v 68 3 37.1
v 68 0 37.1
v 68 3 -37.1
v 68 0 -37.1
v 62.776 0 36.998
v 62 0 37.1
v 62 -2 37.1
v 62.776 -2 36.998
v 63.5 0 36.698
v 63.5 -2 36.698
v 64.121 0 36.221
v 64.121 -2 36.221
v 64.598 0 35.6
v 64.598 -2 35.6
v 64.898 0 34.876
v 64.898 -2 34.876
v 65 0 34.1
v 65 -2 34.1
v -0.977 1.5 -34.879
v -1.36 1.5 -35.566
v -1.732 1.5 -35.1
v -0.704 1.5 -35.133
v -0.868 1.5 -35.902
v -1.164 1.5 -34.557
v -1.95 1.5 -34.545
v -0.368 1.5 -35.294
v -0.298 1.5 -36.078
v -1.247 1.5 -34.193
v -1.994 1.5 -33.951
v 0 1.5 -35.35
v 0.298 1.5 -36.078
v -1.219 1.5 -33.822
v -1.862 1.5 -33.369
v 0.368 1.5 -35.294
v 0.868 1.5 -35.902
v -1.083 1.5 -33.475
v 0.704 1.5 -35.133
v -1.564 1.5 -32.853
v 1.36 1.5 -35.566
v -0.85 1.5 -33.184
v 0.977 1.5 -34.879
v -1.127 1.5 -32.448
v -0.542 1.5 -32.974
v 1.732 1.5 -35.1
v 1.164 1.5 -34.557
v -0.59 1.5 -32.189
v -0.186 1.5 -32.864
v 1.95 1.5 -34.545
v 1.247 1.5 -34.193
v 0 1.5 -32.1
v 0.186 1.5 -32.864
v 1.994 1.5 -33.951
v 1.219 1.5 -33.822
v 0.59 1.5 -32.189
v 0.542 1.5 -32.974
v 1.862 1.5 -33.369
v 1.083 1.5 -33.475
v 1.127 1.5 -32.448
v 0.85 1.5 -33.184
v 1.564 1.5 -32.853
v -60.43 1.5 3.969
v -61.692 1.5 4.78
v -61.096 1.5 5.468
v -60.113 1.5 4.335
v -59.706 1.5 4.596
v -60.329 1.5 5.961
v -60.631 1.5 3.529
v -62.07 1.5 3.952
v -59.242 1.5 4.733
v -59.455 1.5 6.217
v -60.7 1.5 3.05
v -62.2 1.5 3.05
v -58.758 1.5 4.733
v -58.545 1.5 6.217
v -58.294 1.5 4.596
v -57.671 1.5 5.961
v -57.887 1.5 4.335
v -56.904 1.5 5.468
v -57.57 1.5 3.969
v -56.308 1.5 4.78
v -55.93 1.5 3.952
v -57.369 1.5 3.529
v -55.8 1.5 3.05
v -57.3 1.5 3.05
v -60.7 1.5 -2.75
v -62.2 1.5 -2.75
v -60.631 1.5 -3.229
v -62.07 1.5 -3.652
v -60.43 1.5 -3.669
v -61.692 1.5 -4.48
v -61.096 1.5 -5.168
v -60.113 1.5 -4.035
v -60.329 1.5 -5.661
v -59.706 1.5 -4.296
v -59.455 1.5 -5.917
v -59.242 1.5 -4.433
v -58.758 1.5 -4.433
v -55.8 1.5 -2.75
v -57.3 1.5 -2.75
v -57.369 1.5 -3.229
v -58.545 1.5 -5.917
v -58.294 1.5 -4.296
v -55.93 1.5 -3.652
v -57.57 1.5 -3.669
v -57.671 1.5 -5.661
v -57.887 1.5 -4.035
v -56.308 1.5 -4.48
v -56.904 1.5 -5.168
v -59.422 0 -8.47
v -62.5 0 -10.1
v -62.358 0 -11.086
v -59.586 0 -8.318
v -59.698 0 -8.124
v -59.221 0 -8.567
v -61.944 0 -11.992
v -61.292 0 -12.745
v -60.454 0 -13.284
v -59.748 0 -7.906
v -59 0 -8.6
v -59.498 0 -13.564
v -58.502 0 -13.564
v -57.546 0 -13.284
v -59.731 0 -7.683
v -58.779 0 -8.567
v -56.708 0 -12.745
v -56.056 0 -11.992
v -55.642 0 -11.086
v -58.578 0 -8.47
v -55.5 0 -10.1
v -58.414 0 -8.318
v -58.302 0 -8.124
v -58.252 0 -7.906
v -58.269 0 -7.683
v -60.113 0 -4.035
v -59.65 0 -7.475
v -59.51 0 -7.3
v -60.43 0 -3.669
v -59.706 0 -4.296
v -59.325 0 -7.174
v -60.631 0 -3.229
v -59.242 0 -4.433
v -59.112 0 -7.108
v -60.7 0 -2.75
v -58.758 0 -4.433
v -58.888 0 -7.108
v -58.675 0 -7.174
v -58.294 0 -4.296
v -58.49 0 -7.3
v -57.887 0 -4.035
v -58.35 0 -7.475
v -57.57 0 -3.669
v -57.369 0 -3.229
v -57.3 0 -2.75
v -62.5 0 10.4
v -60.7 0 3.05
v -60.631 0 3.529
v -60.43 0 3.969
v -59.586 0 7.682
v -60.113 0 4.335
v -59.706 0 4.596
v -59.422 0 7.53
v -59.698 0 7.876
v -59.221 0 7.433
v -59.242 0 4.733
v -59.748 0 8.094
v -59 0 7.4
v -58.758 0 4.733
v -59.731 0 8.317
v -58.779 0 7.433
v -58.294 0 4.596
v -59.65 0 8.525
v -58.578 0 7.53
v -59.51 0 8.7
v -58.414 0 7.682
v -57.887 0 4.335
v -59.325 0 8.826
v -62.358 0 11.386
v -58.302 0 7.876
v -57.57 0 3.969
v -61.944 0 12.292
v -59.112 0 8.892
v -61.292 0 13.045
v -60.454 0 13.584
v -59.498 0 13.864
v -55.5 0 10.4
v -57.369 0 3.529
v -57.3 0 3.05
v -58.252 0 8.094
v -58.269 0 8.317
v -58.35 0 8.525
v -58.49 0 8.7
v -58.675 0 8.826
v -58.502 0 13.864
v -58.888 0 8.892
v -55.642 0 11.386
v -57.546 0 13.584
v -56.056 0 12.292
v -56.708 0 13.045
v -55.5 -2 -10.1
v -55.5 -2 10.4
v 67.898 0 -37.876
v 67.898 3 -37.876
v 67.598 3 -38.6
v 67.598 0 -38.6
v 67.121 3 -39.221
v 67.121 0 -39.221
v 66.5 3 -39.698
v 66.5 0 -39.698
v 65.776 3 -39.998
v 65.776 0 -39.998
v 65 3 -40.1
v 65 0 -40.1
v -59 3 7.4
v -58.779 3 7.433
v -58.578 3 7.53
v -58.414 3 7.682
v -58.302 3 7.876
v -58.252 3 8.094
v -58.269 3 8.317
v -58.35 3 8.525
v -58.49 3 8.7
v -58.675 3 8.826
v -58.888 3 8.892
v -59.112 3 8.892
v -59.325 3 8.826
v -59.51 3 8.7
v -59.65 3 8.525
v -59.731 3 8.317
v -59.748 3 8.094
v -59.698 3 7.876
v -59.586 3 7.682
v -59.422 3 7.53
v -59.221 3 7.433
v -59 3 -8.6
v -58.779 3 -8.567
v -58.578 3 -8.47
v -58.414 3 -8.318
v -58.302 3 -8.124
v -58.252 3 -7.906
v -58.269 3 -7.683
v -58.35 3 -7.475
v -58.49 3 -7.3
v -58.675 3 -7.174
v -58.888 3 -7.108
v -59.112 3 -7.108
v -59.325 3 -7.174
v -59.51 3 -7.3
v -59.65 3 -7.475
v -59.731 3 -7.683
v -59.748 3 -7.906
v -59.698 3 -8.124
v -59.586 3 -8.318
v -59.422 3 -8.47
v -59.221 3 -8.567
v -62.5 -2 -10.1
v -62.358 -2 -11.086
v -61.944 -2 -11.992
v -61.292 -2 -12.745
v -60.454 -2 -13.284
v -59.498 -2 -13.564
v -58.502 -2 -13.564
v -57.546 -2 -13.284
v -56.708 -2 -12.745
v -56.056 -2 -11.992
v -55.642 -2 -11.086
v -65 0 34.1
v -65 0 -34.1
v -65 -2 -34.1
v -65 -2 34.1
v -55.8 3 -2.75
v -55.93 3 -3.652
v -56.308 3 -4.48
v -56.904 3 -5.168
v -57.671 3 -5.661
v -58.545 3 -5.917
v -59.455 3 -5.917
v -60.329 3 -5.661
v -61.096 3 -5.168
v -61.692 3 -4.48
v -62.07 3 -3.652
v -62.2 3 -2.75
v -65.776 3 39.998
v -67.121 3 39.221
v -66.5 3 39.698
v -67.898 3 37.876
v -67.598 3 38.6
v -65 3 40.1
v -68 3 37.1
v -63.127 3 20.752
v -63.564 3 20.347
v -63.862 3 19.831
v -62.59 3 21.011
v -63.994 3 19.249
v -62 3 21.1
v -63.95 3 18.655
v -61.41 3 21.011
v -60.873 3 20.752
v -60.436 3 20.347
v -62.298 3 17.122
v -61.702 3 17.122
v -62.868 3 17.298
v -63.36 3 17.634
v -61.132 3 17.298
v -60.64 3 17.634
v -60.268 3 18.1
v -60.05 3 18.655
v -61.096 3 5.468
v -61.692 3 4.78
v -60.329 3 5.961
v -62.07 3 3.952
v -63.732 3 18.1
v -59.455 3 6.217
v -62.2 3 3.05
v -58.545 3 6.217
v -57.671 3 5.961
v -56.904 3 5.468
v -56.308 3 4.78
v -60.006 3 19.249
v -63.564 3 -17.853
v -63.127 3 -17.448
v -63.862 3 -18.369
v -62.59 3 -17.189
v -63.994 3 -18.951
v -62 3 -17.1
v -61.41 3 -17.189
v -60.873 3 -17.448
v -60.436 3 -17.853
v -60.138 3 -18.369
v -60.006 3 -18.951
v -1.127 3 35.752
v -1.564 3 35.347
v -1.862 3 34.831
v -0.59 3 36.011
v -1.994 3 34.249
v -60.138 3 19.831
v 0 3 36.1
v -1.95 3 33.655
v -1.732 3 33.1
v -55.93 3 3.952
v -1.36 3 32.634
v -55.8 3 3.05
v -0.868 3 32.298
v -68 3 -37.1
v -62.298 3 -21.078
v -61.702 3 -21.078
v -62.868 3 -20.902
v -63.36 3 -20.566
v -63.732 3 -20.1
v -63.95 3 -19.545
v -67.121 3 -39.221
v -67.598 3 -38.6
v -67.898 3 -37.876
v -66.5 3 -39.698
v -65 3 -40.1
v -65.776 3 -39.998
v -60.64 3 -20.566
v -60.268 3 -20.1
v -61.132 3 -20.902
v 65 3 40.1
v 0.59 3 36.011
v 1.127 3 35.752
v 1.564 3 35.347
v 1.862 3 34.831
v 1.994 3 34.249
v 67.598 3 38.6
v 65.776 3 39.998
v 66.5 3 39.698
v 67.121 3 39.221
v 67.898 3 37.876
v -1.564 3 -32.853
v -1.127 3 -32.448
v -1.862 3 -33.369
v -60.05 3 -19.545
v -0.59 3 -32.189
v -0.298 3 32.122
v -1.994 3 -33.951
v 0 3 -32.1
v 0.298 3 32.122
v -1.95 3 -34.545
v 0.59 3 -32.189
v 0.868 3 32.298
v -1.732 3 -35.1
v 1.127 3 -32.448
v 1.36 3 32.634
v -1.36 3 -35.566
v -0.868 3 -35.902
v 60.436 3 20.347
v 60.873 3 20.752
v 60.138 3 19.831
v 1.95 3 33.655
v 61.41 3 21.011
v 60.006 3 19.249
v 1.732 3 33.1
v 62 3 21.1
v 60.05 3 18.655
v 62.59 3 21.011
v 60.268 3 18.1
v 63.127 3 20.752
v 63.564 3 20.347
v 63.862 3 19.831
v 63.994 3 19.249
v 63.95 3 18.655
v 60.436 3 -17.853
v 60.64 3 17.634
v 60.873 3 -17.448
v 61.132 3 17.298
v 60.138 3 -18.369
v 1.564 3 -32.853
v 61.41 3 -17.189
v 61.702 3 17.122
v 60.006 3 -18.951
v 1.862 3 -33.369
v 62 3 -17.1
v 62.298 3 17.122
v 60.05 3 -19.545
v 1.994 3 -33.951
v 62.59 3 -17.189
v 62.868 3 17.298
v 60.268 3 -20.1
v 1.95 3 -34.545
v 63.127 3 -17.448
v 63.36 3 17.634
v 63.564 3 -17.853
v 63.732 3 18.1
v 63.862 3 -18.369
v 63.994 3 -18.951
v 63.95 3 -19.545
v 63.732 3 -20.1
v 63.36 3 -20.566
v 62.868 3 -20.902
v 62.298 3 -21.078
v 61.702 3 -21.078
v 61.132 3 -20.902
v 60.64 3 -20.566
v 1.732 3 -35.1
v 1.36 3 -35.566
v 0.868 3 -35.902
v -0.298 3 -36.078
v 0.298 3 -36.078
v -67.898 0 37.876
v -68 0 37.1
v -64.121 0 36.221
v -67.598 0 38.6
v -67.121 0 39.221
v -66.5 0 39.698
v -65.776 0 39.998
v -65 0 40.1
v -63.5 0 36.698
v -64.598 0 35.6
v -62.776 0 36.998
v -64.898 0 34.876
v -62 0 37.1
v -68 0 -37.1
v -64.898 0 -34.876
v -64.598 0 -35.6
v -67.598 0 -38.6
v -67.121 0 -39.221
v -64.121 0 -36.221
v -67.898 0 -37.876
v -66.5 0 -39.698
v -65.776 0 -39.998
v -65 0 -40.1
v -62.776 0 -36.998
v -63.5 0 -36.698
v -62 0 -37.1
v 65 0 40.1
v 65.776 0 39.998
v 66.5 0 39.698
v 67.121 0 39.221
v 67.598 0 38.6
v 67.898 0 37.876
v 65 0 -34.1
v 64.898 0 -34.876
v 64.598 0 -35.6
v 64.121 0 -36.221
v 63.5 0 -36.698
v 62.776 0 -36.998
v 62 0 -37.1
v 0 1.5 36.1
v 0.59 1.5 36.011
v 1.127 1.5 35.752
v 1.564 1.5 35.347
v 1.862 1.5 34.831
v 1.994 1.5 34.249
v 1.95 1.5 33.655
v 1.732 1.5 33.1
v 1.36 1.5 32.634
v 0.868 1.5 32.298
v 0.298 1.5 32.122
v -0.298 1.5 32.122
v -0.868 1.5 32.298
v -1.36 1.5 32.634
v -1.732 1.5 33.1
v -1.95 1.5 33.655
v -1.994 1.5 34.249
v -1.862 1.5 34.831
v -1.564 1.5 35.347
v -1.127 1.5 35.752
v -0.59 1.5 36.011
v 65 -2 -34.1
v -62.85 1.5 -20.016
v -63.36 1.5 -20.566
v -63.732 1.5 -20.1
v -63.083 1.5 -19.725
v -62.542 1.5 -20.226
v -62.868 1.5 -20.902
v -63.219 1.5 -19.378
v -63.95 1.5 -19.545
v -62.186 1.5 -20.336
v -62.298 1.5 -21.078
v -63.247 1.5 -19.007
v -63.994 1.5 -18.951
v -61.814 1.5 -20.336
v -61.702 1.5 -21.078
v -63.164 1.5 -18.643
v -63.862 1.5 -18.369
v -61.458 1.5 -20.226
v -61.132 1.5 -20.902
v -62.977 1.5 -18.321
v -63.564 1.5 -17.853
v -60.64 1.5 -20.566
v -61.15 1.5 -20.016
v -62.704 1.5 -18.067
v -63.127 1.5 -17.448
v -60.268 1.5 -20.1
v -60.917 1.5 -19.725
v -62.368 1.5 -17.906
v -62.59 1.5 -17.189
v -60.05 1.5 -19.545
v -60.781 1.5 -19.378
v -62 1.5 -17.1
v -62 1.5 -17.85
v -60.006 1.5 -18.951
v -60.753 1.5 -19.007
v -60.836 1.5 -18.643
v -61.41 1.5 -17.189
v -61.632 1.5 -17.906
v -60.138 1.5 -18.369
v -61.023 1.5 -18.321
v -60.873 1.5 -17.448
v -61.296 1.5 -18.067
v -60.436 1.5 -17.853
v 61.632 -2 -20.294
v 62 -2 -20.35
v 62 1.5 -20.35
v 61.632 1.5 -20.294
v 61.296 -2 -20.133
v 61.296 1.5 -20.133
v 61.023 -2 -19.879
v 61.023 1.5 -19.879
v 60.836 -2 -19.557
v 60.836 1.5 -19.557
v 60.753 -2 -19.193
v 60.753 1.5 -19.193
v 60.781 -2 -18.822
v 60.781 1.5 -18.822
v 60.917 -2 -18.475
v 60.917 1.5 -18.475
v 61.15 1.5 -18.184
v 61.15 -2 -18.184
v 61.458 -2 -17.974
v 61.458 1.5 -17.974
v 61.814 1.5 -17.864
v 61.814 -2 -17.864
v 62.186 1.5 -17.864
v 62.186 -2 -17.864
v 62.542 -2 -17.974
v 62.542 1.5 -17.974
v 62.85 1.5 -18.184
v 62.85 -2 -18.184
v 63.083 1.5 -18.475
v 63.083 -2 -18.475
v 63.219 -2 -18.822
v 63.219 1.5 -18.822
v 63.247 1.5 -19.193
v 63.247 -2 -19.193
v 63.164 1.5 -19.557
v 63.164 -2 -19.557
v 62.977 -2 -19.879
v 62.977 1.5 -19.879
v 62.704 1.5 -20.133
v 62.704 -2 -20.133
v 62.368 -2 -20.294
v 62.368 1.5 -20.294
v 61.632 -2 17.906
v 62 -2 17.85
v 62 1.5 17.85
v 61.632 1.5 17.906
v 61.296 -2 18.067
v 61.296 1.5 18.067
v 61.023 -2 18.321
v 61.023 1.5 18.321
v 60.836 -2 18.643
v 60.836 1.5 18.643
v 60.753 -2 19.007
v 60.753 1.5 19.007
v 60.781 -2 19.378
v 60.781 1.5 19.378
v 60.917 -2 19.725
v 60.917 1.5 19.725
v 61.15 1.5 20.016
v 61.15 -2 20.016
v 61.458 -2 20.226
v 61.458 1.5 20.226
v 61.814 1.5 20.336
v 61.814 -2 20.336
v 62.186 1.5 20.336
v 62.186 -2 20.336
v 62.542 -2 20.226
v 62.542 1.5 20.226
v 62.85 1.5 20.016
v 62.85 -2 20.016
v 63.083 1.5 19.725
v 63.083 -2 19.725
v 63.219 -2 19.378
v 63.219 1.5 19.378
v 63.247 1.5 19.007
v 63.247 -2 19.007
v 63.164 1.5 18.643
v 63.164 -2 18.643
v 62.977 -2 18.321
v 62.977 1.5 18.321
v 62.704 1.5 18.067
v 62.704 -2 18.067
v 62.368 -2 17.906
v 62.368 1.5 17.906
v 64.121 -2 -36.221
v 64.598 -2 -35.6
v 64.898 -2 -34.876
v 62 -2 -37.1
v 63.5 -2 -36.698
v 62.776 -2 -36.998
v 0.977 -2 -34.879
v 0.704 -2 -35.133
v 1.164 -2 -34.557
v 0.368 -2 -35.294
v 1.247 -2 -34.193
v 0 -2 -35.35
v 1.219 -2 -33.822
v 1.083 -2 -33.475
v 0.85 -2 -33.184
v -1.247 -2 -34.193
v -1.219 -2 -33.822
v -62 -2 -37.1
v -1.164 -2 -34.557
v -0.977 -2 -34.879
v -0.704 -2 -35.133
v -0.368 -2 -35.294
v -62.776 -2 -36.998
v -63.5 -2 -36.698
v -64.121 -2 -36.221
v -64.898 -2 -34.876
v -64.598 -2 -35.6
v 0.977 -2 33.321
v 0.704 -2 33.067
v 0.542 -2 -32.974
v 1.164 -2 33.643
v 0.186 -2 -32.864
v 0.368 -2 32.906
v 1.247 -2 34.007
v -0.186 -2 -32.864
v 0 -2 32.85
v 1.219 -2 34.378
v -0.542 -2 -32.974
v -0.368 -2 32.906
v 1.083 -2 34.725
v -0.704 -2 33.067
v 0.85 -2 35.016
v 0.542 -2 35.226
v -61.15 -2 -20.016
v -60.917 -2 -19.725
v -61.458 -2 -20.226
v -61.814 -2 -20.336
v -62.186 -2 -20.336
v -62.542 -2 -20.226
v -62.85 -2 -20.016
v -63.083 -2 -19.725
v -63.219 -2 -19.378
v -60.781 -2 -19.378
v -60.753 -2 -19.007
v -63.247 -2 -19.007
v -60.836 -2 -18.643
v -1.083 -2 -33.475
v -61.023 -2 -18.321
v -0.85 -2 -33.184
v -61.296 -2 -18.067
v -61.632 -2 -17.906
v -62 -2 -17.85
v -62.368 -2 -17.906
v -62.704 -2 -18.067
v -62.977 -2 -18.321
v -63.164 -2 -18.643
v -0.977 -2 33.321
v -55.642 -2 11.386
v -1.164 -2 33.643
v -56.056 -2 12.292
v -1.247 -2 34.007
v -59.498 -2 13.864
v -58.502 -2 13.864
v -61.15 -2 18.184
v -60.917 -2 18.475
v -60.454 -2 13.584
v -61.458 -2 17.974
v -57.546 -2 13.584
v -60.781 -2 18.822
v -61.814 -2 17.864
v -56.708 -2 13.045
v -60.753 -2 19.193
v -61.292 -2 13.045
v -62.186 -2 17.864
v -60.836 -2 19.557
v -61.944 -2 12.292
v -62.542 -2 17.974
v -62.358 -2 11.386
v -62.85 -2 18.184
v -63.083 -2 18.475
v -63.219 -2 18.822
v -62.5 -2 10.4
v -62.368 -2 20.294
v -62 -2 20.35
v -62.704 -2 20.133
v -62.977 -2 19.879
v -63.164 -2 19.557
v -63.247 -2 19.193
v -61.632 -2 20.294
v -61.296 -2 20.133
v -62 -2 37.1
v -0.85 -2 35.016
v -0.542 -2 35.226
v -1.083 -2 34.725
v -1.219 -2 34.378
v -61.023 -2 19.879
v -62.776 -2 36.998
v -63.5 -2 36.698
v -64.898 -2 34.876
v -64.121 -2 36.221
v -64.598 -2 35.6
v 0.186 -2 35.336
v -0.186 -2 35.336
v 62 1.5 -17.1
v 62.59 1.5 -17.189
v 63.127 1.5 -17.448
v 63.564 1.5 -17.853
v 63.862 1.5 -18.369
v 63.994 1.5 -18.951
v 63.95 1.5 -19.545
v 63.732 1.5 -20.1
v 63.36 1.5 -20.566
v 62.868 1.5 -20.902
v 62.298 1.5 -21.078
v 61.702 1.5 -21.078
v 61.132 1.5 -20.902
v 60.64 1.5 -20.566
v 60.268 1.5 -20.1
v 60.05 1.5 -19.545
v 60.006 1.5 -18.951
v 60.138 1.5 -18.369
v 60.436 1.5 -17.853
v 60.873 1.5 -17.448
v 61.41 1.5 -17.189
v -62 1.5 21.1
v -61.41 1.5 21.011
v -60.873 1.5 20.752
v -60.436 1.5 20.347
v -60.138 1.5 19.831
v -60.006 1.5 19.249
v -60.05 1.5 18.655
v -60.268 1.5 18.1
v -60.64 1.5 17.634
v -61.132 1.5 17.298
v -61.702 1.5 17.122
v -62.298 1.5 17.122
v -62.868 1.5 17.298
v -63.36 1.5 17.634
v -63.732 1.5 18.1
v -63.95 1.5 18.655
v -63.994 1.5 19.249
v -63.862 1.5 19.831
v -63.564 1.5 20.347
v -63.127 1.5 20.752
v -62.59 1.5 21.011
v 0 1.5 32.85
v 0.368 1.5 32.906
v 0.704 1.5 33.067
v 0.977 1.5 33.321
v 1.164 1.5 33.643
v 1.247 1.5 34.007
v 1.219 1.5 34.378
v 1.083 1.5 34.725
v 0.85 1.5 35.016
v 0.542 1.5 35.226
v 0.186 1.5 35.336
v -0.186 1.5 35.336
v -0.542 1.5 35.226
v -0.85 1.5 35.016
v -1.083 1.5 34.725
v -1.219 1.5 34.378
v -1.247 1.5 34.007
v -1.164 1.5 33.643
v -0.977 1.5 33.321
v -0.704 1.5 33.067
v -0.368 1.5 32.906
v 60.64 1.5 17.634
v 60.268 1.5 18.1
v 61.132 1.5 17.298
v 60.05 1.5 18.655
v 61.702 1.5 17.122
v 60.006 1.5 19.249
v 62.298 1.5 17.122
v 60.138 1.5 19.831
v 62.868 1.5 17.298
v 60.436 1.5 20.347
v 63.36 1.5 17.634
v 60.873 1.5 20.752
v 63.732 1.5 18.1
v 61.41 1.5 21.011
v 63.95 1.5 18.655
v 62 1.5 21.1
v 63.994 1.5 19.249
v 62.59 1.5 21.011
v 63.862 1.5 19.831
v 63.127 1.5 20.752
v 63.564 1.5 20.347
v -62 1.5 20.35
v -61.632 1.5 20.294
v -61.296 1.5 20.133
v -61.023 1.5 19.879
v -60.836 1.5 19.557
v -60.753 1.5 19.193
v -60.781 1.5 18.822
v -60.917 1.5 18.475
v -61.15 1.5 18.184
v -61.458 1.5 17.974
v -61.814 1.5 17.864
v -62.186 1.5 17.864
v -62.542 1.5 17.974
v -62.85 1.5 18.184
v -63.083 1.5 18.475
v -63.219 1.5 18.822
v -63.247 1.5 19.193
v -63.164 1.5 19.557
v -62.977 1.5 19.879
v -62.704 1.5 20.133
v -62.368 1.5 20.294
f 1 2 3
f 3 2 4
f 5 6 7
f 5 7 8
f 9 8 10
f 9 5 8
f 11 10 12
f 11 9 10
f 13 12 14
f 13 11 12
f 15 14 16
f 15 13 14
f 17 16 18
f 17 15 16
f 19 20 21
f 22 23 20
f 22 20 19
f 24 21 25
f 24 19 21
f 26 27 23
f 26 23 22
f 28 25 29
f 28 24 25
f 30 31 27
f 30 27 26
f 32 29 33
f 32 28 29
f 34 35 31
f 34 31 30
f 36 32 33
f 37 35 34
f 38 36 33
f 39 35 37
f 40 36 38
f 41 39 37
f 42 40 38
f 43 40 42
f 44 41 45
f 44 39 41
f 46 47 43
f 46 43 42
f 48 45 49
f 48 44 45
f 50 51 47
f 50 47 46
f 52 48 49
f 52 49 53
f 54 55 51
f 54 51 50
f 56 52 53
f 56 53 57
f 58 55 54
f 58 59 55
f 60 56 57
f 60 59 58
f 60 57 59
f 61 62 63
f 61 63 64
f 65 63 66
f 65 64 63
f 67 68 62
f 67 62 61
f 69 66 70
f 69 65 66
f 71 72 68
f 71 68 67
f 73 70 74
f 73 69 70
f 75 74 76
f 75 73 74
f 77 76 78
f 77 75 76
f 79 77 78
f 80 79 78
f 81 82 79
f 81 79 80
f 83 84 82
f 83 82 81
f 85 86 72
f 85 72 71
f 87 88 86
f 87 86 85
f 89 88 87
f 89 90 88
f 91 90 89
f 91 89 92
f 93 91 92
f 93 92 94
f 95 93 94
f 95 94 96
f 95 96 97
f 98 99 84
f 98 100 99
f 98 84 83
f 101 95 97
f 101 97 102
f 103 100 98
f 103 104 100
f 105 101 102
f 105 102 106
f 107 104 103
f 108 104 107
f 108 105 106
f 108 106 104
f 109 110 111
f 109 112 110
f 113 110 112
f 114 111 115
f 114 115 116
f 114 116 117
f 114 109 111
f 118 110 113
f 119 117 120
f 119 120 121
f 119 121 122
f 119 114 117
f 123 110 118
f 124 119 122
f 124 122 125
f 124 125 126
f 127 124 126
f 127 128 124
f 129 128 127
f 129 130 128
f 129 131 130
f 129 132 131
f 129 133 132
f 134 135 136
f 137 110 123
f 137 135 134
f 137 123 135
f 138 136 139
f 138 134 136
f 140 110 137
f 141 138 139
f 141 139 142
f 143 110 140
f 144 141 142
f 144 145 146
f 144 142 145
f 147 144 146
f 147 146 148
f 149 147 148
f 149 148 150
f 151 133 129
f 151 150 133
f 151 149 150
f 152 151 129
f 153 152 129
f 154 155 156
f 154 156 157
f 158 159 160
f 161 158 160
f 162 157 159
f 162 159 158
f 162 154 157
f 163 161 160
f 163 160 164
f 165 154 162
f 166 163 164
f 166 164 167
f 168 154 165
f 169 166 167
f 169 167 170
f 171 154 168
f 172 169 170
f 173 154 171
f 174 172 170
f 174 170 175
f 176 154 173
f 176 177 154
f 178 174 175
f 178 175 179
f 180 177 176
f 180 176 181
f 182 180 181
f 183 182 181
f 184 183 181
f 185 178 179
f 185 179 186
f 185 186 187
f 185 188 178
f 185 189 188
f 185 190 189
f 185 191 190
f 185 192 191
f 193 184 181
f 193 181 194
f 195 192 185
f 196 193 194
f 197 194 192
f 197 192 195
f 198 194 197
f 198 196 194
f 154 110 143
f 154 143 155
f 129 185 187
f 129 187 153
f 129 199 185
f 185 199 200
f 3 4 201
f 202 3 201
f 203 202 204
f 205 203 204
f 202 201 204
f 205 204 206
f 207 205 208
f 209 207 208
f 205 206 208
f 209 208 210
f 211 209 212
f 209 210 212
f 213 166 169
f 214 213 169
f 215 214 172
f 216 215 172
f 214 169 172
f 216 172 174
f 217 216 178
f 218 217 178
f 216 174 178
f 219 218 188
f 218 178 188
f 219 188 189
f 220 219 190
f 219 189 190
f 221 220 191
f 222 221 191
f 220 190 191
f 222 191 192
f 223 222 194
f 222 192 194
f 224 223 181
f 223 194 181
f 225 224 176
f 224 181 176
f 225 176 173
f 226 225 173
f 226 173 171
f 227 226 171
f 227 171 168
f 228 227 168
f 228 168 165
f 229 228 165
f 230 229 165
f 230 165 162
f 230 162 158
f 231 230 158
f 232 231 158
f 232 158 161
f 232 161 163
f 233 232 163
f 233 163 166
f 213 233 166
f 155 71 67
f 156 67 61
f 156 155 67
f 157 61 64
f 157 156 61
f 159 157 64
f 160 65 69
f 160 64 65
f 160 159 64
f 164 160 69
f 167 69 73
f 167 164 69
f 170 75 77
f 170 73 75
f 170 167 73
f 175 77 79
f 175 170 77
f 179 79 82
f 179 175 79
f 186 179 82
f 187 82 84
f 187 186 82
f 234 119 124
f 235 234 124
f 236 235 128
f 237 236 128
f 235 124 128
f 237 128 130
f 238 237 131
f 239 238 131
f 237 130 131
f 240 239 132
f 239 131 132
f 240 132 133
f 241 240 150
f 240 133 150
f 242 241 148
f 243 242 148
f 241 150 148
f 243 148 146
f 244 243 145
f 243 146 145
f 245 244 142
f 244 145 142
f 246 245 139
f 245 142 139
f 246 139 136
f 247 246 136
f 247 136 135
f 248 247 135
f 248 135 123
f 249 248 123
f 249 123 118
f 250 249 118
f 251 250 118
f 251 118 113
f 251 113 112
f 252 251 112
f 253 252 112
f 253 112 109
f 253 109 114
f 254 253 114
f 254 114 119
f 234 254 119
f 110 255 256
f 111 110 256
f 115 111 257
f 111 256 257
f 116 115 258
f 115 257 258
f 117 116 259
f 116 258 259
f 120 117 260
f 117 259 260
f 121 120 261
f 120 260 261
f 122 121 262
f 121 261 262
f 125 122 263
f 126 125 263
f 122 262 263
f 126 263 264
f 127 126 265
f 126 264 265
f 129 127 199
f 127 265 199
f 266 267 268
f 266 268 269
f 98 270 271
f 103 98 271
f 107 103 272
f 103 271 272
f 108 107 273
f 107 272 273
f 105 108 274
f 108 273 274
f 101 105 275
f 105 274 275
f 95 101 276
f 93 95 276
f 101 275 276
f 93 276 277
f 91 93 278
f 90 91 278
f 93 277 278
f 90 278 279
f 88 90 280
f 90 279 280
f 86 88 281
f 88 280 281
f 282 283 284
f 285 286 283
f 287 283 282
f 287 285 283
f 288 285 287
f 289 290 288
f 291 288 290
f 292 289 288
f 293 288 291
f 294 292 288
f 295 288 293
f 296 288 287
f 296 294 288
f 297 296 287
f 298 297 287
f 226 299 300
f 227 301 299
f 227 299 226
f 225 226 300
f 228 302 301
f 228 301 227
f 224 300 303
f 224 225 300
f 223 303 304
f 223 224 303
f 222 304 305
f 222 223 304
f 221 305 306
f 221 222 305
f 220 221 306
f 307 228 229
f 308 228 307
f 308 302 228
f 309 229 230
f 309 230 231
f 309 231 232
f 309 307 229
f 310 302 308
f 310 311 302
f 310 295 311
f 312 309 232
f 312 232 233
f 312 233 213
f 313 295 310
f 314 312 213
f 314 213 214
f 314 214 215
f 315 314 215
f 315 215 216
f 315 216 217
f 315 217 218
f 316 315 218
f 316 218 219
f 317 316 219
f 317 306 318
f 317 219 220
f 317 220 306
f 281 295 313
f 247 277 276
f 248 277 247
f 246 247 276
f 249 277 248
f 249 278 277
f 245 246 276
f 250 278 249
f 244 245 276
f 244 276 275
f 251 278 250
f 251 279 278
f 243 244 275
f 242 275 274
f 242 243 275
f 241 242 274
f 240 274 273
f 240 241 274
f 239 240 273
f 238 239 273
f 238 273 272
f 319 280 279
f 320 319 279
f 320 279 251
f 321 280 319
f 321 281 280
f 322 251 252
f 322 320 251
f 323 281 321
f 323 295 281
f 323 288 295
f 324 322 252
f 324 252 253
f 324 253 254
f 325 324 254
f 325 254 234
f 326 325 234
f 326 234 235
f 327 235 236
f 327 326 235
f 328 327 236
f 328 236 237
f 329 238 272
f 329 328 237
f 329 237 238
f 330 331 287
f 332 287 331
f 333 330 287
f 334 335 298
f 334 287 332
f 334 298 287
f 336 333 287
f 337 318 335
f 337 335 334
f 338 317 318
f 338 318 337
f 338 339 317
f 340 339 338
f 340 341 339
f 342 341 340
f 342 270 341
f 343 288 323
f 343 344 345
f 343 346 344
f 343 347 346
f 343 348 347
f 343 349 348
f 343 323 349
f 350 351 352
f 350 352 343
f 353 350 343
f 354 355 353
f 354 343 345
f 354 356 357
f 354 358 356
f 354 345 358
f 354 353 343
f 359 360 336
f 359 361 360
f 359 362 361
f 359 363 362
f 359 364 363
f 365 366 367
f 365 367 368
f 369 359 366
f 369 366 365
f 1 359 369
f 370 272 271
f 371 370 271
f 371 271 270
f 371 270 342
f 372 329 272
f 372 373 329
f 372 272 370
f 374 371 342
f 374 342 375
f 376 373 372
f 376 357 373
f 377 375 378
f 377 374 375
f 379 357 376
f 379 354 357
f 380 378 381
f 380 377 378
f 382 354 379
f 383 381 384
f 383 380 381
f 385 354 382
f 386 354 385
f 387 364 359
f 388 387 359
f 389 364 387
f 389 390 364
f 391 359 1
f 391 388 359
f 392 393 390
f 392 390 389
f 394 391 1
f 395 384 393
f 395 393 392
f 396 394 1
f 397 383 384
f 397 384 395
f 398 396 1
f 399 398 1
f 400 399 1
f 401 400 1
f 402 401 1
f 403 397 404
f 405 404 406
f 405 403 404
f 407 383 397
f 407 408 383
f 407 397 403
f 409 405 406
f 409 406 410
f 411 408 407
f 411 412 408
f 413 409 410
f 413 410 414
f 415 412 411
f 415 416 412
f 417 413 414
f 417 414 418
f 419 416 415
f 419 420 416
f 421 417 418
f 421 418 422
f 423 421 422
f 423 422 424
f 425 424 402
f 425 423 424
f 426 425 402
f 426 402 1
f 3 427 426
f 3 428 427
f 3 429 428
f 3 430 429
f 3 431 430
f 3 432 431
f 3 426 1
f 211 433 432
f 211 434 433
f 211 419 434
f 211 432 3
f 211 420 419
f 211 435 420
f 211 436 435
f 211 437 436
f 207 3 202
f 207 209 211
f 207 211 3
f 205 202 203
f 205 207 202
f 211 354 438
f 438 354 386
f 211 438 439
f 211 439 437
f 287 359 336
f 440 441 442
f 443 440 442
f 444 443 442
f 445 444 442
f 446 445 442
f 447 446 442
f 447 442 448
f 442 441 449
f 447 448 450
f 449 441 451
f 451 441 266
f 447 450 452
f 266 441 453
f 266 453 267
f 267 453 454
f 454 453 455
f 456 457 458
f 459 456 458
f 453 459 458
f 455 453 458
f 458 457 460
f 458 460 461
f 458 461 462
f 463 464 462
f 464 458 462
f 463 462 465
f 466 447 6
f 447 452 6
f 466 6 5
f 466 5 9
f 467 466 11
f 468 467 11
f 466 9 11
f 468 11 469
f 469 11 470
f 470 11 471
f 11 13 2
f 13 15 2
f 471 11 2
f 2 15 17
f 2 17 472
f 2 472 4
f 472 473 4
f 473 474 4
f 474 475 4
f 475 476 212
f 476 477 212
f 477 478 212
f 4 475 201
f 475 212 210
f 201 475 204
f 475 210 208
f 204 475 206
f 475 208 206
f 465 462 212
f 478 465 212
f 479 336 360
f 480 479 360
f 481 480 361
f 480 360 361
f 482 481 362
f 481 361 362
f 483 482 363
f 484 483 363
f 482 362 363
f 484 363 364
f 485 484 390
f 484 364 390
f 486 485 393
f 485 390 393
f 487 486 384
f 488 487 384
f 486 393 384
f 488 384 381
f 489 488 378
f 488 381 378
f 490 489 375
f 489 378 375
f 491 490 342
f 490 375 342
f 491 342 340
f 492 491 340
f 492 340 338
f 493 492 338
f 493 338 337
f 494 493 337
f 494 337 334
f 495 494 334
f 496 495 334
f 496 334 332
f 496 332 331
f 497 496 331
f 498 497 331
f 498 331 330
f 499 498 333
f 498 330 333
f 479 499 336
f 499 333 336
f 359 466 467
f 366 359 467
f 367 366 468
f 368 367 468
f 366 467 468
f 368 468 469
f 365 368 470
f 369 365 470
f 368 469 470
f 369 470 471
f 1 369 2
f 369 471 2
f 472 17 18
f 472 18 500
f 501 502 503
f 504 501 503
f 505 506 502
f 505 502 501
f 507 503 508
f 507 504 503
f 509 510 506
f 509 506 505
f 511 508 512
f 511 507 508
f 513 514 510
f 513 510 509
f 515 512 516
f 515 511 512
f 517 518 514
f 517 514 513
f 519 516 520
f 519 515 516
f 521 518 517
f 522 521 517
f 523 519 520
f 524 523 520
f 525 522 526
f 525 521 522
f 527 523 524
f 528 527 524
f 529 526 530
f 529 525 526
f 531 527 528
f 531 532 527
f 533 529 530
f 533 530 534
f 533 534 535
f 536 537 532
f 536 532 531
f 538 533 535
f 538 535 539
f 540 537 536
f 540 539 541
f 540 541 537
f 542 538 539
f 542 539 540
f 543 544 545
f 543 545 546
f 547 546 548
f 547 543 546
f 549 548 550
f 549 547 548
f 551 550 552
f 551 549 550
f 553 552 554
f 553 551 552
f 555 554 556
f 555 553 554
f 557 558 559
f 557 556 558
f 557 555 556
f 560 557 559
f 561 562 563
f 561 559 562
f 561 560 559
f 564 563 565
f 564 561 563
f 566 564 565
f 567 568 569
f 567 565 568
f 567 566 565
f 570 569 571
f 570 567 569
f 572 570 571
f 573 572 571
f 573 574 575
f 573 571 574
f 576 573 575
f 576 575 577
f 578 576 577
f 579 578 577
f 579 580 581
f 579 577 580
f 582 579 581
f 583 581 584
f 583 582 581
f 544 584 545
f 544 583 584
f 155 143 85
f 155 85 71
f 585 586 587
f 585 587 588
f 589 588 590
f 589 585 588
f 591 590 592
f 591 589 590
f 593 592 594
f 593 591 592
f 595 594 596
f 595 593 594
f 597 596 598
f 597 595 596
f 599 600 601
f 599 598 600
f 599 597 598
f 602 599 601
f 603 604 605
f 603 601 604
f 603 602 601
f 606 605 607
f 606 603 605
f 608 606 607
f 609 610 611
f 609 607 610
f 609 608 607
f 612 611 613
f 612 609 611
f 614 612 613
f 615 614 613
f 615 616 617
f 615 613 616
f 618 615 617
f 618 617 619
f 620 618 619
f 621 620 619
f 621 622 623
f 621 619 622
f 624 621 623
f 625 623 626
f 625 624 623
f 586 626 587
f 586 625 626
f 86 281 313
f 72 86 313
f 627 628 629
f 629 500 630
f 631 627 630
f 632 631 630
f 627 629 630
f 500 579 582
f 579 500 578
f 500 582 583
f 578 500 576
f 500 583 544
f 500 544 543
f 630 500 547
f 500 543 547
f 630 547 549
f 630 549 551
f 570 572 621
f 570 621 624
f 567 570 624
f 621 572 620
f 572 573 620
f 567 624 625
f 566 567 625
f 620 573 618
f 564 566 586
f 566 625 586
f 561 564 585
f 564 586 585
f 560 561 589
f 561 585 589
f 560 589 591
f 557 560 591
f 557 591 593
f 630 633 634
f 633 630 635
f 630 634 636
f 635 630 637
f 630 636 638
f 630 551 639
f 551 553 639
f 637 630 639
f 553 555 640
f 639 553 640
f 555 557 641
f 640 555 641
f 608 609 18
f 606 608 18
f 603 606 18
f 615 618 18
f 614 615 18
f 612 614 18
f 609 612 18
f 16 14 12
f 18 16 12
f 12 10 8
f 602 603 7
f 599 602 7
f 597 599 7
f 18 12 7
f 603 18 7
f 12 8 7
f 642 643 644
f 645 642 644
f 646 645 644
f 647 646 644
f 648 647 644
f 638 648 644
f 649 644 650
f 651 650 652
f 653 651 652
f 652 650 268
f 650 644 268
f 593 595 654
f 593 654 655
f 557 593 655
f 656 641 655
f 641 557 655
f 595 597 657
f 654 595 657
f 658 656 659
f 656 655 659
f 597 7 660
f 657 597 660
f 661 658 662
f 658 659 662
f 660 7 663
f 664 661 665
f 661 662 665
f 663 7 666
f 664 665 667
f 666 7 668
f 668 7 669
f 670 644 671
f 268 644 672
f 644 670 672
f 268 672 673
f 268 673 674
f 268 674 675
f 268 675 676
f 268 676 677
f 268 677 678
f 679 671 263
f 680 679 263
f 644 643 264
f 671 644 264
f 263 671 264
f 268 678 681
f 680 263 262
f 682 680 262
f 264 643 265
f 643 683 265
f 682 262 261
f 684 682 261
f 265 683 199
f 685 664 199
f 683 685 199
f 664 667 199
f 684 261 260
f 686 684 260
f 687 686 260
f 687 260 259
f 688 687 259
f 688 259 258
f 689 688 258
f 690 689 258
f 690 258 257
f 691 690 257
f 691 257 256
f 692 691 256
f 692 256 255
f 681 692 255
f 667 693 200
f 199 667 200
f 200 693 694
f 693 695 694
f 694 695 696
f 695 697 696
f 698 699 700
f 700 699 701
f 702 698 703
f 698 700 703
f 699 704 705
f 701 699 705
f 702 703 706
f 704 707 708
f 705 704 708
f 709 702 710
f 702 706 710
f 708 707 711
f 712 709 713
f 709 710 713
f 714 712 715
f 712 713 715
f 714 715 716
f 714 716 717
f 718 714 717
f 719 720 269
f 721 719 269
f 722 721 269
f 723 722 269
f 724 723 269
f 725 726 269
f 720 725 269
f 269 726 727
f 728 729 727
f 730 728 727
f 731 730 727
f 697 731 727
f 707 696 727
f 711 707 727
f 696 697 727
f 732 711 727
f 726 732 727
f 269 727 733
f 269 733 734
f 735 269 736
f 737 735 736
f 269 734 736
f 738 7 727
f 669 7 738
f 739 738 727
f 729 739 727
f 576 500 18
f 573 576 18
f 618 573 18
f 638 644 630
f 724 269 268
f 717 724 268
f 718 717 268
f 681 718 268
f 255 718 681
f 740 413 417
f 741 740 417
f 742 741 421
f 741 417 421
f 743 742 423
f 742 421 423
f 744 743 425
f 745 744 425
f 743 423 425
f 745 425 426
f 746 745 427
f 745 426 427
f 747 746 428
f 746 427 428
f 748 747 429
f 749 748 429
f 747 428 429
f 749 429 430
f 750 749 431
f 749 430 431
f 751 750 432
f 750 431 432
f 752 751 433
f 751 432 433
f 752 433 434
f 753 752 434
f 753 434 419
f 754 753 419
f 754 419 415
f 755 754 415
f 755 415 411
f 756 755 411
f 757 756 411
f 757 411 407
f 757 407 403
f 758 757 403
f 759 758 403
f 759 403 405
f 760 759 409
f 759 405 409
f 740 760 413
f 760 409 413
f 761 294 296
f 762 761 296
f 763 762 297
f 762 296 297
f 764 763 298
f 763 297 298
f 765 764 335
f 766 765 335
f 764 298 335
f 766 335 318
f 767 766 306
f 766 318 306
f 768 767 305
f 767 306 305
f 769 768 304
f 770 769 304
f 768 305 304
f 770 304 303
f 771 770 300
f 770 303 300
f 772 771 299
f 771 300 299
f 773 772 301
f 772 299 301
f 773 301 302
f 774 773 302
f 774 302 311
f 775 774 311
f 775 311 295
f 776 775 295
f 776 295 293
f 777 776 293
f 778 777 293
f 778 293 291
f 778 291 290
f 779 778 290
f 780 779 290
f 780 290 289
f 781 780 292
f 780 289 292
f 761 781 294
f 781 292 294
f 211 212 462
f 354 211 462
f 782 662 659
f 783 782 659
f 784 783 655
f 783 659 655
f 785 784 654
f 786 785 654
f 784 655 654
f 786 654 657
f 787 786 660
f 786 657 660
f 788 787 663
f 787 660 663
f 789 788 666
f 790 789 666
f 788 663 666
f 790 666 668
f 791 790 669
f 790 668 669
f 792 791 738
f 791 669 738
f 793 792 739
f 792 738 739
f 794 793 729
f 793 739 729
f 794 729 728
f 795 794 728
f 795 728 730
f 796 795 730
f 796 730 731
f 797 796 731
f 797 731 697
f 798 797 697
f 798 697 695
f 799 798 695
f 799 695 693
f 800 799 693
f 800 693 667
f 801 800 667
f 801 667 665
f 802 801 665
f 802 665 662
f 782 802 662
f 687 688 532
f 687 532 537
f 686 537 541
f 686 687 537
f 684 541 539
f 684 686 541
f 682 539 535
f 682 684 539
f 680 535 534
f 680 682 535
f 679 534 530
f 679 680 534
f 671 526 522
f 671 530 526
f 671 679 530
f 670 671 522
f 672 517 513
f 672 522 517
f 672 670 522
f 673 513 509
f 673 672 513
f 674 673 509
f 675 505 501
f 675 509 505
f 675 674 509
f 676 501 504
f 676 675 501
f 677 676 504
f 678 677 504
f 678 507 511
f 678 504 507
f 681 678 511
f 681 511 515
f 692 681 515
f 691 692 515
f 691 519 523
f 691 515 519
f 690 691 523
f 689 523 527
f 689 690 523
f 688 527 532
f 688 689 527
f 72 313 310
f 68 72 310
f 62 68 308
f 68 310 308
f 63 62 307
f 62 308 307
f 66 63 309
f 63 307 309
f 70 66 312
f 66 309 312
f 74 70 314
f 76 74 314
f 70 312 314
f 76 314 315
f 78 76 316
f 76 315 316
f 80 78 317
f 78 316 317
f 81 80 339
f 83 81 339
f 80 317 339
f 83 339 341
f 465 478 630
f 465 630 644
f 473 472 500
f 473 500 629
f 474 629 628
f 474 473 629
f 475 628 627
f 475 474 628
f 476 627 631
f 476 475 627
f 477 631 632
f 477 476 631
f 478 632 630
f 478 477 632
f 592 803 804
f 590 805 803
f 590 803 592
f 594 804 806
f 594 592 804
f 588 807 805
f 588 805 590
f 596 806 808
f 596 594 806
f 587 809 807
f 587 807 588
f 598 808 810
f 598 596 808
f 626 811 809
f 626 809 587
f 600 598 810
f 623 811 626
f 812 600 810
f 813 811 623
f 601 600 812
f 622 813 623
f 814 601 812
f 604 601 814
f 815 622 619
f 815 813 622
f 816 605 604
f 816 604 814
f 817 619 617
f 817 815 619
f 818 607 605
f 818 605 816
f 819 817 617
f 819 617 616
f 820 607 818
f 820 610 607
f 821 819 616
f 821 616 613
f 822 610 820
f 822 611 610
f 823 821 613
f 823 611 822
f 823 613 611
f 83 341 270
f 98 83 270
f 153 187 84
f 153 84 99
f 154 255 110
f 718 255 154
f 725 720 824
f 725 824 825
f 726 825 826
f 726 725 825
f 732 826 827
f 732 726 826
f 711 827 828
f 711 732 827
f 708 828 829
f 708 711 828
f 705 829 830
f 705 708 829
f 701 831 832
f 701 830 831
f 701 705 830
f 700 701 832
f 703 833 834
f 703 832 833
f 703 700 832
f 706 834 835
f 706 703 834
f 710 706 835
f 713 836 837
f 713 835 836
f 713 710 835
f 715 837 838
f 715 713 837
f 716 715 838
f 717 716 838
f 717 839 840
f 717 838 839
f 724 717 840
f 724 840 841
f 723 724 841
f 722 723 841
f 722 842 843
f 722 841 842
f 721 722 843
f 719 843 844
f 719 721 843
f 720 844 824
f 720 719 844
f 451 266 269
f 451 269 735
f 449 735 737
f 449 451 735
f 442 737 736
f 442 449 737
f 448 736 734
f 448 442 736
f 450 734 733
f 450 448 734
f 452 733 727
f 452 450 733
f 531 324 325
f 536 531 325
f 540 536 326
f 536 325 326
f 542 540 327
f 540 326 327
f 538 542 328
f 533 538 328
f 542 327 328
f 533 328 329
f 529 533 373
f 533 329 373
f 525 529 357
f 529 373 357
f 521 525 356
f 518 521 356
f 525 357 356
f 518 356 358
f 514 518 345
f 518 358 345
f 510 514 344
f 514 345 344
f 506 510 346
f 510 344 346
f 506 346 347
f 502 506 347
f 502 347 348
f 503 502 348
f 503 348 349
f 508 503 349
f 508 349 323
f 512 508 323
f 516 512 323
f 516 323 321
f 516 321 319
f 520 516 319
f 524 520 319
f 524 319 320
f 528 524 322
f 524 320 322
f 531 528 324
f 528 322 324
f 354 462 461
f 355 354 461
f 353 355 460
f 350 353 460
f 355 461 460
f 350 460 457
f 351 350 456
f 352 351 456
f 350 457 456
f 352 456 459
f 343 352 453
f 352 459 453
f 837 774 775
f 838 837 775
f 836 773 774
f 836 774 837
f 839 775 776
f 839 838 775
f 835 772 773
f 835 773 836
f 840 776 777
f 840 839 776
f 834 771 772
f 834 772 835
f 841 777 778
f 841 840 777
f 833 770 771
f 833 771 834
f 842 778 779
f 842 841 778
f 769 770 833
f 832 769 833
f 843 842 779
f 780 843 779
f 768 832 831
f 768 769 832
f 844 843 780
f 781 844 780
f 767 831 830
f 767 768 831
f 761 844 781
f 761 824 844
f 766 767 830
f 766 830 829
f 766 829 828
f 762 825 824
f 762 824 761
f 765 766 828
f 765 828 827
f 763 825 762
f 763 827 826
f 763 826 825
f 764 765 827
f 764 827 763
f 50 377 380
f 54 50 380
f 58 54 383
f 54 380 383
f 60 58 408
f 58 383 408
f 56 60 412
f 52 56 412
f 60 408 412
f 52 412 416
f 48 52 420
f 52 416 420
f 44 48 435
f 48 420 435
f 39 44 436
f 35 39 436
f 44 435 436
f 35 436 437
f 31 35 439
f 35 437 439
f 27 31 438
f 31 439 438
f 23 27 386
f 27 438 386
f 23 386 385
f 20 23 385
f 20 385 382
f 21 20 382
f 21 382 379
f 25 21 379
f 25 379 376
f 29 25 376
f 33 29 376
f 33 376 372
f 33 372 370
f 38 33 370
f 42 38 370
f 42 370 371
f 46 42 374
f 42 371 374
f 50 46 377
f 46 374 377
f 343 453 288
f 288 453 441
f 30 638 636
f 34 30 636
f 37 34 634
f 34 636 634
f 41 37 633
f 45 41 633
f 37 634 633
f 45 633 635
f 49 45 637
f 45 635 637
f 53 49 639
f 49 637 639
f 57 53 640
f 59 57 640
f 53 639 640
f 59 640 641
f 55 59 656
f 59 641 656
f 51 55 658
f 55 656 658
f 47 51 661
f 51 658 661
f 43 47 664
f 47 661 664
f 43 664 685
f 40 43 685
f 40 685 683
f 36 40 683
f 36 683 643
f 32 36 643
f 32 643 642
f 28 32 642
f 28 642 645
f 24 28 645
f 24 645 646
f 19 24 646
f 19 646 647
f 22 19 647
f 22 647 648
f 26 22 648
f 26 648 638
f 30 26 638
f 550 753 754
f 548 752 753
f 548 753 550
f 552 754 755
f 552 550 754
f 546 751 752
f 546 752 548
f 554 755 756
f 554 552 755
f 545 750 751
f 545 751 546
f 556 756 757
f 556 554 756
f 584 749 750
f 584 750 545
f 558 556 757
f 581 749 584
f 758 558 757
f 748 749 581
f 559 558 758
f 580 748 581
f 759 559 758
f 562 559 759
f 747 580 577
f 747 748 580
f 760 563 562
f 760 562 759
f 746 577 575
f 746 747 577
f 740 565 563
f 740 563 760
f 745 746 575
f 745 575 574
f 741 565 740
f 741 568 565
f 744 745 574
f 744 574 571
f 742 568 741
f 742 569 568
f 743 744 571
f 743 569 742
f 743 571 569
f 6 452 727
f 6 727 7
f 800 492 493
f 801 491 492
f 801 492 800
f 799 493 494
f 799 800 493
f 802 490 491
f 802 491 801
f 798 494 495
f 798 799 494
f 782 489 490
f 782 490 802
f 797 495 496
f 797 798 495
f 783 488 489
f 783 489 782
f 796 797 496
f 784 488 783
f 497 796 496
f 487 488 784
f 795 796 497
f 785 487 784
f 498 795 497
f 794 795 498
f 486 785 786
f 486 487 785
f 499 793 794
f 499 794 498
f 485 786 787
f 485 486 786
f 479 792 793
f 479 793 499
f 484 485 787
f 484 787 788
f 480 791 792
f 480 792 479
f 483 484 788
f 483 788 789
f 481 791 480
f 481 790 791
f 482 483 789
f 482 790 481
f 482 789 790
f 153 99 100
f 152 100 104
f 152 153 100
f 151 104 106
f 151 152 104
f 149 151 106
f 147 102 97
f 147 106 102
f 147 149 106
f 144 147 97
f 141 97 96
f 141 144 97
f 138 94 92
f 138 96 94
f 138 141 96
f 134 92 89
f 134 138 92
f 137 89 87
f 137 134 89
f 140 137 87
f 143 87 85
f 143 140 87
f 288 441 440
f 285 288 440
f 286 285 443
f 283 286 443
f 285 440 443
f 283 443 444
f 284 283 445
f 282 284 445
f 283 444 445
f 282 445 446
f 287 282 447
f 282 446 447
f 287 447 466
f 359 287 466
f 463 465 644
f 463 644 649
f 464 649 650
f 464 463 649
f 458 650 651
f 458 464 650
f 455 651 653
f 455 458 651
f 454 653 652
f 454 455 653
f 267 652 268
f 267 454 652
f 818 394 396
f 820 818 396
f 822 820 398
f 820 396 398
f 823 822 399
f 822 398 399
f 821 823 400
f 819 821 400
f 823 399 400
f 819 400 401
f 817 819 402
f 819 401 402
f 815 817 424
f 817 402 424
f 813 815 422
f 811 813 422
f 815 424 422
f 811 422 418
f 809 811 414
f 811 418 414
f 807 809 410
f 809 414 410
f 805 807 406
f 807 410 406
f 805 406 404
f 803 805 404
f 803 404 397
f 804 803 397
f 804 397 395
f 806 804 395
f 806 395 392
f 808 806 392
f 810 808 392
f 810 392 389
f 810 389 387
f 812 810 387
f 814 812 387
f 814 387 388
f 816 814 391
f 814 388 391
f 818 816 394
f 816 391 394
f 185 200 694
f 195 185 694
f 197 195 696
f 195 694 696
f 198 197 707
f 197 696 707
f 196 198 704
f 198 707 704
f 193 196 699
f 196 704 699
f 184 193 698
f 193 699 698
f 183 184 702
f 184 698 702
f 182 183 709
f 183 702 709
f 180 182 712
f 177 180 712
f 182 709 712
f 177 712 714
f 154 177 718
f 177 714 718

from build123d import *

# Parameters (mm, degrees)
BOSS_EXTRUDE2_DEPTH      = 3
BOSS_EXTRUDE3_DEPTH      = 2
BOSS_EXTRUDE3_DEPTH_BACK = 3
CUT_EXTRUDE1_DEPTH       = 80.000063291
CUT_EXTRUDE1_DEPTH_BACK  = 80.000063291
SKETCH8_R                = 1.25
SKETCH9_W                = 7
SKETCH9_H                = 20.5
CUT_EXTRUDE2_DEPTH       = 2
SKETCH10_R               = 0.75
CUT_EXTRUDE3_DEPTH       = 80.000063291
SKETCH11_R               = 3.5
CUT_EXTRUDE4_DEPTH       = 2
SKETCH12_R               = 1.25
CUT_EXTRUDE6_DEPTH       = 80.101264212
CUT_EXTRUDE7_DEPTH       = 1.5
SKETCH19_R               = 2
CUT_EXTRUDE9_DEPTH       = 1.5


with BuildPart() as part:
    # Sketch1 → Boss-Extrude2 (new body)
    with BuildSketch(Plane(origin=(0, 0, 0), x_dir=(1, 0, 0), z_dir=(0, 1, 0))):
        with BuildLine():
            Line((65, 40.1), (-65, 40.1))
            ThreePointArc((-65, 40.1), (-67.121320344, 39.221320344), (-68, 37.1))
            Line((-68, 37.1), (-68, -37.1))
            ThreePointArc((-68, -37.1), (-67.121320344, -39.221320344), (-65, -40.1))
            Line((-65, -40.1), (65, -40.1))
            ThreePointArc((65, -40.1), (67.121320344, -39.221320344), (68, -37.1))
            Line((68, -37.1), (68, 37.1))
            ThreePointArc((68, 37.1), (67.121320344, 39.221320344), (65, 40.1))
        make_face()
        with BuildLine():
            Line((65, -34.1), (65, 34.1))
            ThreePointArc((65, 34.1), (64.121320344, 36.221320344), (62, 37.1))
            Line((62, 37.1), (-62, 37.1))
            ThreePointArc((-62, 37.1), (-64.121320344, 36.221320344), (-65, 34.1))
            Line((-65, 34.1), (-65, -34.1))
            ThreePointArc((-65, -34.1), (-64.121320344, -36.221320344), (-62, -37.1))
            Line((-62, -37.1), (62, -37.1))
            ThreePointArc((62, -37.1), (64.121320344, -36.221320344), (65, -34.1))
        make_face(mode=Mode.SUBTRACT)
    extrude(amount=BOSS_EXTRUDE2_DEPTH)

    # Sketch7 → Boss-Extrude3 (add, two sides: drawn at the far end of the back side and taken through both)
    with BuildSketch(Plane.XZ.offset(-BOSS_EXTRUDE3_DEPTH_BACK)):
        with BuildLine():
            Line((-62, 37.1), (62, 37.1))
            ThreePointArc((62, 37.1), (64.121320344, 36.221320344), (65, 34.1))
            Line((65, 34.1), (65, -34.1))
            ThreePointArc((65, -34.1), (64.121320344, -36.221320344), (62, -37.1))
            Line((62, -37.1), (-62, -37.1))
            ThreePointArc((-62, -37.1), (-64.121320344, -36.221320344), (-65, -34.1))
            Line((-65, -34.1), (-65, 34.1))
            ThreePointArc((-65, 34.1), (-64.121320344, 36.221320344), (-62, 37.1))
        make_face()
    extrude(amount=BOSS_EXTRUDE3_DEPTH + BOSS_EXTRUDE3_DEPTH_BACK)

    # Sketch8 → Cut-Extrude1 (cut, two sides: drawn at the far end of the back side and taken through both)
    with BuildSketch(Plane(origin=(0, 0, 0), x_dir=(1, 0, 0), z_dir=(0, 1, 0)).offset(-CUT_EXTRUDE1_DEPTH_BACK)):
        with Locations((62, 19.1)):
            Circle(SKETCH8_R)
        with Locations((62, -19.1)):
            Circle(SKETCH8_R)
        with Locations((-62, -19.1)):
            Circle(SKETCH8_R)
        with Locations((-62, 19.1)):
            Circle(SKETCH8_R)
    extrude(amount=CUT_EXTRUDE1_DEPTH + CUT_EXTRUDE1_DEPTH_BACK, mode=Mode.SUBTRACT)

    # Sketch9 → Cut-Extrude2 (cut)
    with BuildSketch(Plane.XZ.offset(2)):
        with Locations((-59, 0.15)):
            Rectangle(SKETCH9_W, SKETCH9_H)
    extrude(amount=-CUT_EXTRUDE2_DEPTH, mode=Mode.SUBTRACT)

    # Sketch10 → Cut-Extrude3 (cut, through all)
    with BuildSketch(Plane.XZ):
        with Locations((-59, -7.85)):
            Circle(SKETCH10_R)
        with Locations((-59, 8.15)):
            Circle(SKETCH10_R)
        with BuildLine():
            Line((-60.7, -2.75), (-60.7, 3.05))
            ThreePointArc((-60.7, 3.05), (-59, 4.75), (-57.3, 3.05))
            Line((-57.3, 3.05), (-57.3, -2.75))
            ThreePointArc((-57.3, -2.75), (-59, -4.45), (-60.7, -2.75))
        make_face()
    extrude(amount=-CUT_EXTRUDE3_DEPTH, mode=Mode.SUBTRACT)

    # Sketch11 → Cut-Extrude4 (cut)
    with BuildSketch(Plane.XZ.offset(2)):
        with Locations((-59, 10.4)):
            Circle(SKETCH11_R)
        with Locations((-59, -10.1)):
            Circle(SKETCH11_R)
    extrude(amount=-CUT_EXTRUDE4_DEPTH, mode=Mode.SUBTRACT)

    # Sketch12 → Cut-Extrude6 (cut, through all)
    with BuildSketch(Plane.XZ.offset(2)):
        with Locations((0, 34.1)):
            Circle(SKETCH12_R)
        with Locations((0, -34.1)):
            Circle(SKETCH12_R)
    extrude(amount=-CUT_EXTRUDE6_DEPTH, mode=Mode.SUBTRACT)

    # Sketch14 → Cut-Extrude7 (cut)
    with BuildSketch(Plane(origin=(0, 3, 0), x_dir=(1, 0, 0), z_dir=(0, 1, 0))):
        with BuildLine():
            Line((-62.2, 2.75), (-62.2, -3.05))
            ThreePointArc((-62.2, -3.05), (-59, -6.25), (-55.8, -3.05))
            Line((-55.8, -3.05), (-55.8, 2.75))
            ThreePointArc((-55.8, 2.75), (-59, 5.95), (-62.2, 2.75))
        make_face()
    extrude(amount=-CUT_EXTRUDE7_DEPTH, mode=Mode.SUBTRACT)

    # Sketch19 → Cut-Extrude9 (cut)
    with BuildSketch(Plane(origin=(0, 3, 0), x_dir=(1, 0, 0), z_dir=(0, 1, 0))):
        with Locations((-62, -19.1)):
            Circle(SKETCH19_R)
        with Locations((-62, 19.1)):
            Circle(SKETCH19_R)
        with Locations((0, 34.1)):
            Circle(SKETCH19_R)
        with Locations((0, -34.1)):
            Circle(SKETCH19_R)
        with Locations((62, -19.1)):
            Circle(SKETCH19_R)
        with Locations((62, 19.1)):
            Circle(SKETCH19_R)
    extrude(amount=-CUT_EXTRUDE9_DEPTH, mode=Mode.SUBTRACT)


solid = part.part
